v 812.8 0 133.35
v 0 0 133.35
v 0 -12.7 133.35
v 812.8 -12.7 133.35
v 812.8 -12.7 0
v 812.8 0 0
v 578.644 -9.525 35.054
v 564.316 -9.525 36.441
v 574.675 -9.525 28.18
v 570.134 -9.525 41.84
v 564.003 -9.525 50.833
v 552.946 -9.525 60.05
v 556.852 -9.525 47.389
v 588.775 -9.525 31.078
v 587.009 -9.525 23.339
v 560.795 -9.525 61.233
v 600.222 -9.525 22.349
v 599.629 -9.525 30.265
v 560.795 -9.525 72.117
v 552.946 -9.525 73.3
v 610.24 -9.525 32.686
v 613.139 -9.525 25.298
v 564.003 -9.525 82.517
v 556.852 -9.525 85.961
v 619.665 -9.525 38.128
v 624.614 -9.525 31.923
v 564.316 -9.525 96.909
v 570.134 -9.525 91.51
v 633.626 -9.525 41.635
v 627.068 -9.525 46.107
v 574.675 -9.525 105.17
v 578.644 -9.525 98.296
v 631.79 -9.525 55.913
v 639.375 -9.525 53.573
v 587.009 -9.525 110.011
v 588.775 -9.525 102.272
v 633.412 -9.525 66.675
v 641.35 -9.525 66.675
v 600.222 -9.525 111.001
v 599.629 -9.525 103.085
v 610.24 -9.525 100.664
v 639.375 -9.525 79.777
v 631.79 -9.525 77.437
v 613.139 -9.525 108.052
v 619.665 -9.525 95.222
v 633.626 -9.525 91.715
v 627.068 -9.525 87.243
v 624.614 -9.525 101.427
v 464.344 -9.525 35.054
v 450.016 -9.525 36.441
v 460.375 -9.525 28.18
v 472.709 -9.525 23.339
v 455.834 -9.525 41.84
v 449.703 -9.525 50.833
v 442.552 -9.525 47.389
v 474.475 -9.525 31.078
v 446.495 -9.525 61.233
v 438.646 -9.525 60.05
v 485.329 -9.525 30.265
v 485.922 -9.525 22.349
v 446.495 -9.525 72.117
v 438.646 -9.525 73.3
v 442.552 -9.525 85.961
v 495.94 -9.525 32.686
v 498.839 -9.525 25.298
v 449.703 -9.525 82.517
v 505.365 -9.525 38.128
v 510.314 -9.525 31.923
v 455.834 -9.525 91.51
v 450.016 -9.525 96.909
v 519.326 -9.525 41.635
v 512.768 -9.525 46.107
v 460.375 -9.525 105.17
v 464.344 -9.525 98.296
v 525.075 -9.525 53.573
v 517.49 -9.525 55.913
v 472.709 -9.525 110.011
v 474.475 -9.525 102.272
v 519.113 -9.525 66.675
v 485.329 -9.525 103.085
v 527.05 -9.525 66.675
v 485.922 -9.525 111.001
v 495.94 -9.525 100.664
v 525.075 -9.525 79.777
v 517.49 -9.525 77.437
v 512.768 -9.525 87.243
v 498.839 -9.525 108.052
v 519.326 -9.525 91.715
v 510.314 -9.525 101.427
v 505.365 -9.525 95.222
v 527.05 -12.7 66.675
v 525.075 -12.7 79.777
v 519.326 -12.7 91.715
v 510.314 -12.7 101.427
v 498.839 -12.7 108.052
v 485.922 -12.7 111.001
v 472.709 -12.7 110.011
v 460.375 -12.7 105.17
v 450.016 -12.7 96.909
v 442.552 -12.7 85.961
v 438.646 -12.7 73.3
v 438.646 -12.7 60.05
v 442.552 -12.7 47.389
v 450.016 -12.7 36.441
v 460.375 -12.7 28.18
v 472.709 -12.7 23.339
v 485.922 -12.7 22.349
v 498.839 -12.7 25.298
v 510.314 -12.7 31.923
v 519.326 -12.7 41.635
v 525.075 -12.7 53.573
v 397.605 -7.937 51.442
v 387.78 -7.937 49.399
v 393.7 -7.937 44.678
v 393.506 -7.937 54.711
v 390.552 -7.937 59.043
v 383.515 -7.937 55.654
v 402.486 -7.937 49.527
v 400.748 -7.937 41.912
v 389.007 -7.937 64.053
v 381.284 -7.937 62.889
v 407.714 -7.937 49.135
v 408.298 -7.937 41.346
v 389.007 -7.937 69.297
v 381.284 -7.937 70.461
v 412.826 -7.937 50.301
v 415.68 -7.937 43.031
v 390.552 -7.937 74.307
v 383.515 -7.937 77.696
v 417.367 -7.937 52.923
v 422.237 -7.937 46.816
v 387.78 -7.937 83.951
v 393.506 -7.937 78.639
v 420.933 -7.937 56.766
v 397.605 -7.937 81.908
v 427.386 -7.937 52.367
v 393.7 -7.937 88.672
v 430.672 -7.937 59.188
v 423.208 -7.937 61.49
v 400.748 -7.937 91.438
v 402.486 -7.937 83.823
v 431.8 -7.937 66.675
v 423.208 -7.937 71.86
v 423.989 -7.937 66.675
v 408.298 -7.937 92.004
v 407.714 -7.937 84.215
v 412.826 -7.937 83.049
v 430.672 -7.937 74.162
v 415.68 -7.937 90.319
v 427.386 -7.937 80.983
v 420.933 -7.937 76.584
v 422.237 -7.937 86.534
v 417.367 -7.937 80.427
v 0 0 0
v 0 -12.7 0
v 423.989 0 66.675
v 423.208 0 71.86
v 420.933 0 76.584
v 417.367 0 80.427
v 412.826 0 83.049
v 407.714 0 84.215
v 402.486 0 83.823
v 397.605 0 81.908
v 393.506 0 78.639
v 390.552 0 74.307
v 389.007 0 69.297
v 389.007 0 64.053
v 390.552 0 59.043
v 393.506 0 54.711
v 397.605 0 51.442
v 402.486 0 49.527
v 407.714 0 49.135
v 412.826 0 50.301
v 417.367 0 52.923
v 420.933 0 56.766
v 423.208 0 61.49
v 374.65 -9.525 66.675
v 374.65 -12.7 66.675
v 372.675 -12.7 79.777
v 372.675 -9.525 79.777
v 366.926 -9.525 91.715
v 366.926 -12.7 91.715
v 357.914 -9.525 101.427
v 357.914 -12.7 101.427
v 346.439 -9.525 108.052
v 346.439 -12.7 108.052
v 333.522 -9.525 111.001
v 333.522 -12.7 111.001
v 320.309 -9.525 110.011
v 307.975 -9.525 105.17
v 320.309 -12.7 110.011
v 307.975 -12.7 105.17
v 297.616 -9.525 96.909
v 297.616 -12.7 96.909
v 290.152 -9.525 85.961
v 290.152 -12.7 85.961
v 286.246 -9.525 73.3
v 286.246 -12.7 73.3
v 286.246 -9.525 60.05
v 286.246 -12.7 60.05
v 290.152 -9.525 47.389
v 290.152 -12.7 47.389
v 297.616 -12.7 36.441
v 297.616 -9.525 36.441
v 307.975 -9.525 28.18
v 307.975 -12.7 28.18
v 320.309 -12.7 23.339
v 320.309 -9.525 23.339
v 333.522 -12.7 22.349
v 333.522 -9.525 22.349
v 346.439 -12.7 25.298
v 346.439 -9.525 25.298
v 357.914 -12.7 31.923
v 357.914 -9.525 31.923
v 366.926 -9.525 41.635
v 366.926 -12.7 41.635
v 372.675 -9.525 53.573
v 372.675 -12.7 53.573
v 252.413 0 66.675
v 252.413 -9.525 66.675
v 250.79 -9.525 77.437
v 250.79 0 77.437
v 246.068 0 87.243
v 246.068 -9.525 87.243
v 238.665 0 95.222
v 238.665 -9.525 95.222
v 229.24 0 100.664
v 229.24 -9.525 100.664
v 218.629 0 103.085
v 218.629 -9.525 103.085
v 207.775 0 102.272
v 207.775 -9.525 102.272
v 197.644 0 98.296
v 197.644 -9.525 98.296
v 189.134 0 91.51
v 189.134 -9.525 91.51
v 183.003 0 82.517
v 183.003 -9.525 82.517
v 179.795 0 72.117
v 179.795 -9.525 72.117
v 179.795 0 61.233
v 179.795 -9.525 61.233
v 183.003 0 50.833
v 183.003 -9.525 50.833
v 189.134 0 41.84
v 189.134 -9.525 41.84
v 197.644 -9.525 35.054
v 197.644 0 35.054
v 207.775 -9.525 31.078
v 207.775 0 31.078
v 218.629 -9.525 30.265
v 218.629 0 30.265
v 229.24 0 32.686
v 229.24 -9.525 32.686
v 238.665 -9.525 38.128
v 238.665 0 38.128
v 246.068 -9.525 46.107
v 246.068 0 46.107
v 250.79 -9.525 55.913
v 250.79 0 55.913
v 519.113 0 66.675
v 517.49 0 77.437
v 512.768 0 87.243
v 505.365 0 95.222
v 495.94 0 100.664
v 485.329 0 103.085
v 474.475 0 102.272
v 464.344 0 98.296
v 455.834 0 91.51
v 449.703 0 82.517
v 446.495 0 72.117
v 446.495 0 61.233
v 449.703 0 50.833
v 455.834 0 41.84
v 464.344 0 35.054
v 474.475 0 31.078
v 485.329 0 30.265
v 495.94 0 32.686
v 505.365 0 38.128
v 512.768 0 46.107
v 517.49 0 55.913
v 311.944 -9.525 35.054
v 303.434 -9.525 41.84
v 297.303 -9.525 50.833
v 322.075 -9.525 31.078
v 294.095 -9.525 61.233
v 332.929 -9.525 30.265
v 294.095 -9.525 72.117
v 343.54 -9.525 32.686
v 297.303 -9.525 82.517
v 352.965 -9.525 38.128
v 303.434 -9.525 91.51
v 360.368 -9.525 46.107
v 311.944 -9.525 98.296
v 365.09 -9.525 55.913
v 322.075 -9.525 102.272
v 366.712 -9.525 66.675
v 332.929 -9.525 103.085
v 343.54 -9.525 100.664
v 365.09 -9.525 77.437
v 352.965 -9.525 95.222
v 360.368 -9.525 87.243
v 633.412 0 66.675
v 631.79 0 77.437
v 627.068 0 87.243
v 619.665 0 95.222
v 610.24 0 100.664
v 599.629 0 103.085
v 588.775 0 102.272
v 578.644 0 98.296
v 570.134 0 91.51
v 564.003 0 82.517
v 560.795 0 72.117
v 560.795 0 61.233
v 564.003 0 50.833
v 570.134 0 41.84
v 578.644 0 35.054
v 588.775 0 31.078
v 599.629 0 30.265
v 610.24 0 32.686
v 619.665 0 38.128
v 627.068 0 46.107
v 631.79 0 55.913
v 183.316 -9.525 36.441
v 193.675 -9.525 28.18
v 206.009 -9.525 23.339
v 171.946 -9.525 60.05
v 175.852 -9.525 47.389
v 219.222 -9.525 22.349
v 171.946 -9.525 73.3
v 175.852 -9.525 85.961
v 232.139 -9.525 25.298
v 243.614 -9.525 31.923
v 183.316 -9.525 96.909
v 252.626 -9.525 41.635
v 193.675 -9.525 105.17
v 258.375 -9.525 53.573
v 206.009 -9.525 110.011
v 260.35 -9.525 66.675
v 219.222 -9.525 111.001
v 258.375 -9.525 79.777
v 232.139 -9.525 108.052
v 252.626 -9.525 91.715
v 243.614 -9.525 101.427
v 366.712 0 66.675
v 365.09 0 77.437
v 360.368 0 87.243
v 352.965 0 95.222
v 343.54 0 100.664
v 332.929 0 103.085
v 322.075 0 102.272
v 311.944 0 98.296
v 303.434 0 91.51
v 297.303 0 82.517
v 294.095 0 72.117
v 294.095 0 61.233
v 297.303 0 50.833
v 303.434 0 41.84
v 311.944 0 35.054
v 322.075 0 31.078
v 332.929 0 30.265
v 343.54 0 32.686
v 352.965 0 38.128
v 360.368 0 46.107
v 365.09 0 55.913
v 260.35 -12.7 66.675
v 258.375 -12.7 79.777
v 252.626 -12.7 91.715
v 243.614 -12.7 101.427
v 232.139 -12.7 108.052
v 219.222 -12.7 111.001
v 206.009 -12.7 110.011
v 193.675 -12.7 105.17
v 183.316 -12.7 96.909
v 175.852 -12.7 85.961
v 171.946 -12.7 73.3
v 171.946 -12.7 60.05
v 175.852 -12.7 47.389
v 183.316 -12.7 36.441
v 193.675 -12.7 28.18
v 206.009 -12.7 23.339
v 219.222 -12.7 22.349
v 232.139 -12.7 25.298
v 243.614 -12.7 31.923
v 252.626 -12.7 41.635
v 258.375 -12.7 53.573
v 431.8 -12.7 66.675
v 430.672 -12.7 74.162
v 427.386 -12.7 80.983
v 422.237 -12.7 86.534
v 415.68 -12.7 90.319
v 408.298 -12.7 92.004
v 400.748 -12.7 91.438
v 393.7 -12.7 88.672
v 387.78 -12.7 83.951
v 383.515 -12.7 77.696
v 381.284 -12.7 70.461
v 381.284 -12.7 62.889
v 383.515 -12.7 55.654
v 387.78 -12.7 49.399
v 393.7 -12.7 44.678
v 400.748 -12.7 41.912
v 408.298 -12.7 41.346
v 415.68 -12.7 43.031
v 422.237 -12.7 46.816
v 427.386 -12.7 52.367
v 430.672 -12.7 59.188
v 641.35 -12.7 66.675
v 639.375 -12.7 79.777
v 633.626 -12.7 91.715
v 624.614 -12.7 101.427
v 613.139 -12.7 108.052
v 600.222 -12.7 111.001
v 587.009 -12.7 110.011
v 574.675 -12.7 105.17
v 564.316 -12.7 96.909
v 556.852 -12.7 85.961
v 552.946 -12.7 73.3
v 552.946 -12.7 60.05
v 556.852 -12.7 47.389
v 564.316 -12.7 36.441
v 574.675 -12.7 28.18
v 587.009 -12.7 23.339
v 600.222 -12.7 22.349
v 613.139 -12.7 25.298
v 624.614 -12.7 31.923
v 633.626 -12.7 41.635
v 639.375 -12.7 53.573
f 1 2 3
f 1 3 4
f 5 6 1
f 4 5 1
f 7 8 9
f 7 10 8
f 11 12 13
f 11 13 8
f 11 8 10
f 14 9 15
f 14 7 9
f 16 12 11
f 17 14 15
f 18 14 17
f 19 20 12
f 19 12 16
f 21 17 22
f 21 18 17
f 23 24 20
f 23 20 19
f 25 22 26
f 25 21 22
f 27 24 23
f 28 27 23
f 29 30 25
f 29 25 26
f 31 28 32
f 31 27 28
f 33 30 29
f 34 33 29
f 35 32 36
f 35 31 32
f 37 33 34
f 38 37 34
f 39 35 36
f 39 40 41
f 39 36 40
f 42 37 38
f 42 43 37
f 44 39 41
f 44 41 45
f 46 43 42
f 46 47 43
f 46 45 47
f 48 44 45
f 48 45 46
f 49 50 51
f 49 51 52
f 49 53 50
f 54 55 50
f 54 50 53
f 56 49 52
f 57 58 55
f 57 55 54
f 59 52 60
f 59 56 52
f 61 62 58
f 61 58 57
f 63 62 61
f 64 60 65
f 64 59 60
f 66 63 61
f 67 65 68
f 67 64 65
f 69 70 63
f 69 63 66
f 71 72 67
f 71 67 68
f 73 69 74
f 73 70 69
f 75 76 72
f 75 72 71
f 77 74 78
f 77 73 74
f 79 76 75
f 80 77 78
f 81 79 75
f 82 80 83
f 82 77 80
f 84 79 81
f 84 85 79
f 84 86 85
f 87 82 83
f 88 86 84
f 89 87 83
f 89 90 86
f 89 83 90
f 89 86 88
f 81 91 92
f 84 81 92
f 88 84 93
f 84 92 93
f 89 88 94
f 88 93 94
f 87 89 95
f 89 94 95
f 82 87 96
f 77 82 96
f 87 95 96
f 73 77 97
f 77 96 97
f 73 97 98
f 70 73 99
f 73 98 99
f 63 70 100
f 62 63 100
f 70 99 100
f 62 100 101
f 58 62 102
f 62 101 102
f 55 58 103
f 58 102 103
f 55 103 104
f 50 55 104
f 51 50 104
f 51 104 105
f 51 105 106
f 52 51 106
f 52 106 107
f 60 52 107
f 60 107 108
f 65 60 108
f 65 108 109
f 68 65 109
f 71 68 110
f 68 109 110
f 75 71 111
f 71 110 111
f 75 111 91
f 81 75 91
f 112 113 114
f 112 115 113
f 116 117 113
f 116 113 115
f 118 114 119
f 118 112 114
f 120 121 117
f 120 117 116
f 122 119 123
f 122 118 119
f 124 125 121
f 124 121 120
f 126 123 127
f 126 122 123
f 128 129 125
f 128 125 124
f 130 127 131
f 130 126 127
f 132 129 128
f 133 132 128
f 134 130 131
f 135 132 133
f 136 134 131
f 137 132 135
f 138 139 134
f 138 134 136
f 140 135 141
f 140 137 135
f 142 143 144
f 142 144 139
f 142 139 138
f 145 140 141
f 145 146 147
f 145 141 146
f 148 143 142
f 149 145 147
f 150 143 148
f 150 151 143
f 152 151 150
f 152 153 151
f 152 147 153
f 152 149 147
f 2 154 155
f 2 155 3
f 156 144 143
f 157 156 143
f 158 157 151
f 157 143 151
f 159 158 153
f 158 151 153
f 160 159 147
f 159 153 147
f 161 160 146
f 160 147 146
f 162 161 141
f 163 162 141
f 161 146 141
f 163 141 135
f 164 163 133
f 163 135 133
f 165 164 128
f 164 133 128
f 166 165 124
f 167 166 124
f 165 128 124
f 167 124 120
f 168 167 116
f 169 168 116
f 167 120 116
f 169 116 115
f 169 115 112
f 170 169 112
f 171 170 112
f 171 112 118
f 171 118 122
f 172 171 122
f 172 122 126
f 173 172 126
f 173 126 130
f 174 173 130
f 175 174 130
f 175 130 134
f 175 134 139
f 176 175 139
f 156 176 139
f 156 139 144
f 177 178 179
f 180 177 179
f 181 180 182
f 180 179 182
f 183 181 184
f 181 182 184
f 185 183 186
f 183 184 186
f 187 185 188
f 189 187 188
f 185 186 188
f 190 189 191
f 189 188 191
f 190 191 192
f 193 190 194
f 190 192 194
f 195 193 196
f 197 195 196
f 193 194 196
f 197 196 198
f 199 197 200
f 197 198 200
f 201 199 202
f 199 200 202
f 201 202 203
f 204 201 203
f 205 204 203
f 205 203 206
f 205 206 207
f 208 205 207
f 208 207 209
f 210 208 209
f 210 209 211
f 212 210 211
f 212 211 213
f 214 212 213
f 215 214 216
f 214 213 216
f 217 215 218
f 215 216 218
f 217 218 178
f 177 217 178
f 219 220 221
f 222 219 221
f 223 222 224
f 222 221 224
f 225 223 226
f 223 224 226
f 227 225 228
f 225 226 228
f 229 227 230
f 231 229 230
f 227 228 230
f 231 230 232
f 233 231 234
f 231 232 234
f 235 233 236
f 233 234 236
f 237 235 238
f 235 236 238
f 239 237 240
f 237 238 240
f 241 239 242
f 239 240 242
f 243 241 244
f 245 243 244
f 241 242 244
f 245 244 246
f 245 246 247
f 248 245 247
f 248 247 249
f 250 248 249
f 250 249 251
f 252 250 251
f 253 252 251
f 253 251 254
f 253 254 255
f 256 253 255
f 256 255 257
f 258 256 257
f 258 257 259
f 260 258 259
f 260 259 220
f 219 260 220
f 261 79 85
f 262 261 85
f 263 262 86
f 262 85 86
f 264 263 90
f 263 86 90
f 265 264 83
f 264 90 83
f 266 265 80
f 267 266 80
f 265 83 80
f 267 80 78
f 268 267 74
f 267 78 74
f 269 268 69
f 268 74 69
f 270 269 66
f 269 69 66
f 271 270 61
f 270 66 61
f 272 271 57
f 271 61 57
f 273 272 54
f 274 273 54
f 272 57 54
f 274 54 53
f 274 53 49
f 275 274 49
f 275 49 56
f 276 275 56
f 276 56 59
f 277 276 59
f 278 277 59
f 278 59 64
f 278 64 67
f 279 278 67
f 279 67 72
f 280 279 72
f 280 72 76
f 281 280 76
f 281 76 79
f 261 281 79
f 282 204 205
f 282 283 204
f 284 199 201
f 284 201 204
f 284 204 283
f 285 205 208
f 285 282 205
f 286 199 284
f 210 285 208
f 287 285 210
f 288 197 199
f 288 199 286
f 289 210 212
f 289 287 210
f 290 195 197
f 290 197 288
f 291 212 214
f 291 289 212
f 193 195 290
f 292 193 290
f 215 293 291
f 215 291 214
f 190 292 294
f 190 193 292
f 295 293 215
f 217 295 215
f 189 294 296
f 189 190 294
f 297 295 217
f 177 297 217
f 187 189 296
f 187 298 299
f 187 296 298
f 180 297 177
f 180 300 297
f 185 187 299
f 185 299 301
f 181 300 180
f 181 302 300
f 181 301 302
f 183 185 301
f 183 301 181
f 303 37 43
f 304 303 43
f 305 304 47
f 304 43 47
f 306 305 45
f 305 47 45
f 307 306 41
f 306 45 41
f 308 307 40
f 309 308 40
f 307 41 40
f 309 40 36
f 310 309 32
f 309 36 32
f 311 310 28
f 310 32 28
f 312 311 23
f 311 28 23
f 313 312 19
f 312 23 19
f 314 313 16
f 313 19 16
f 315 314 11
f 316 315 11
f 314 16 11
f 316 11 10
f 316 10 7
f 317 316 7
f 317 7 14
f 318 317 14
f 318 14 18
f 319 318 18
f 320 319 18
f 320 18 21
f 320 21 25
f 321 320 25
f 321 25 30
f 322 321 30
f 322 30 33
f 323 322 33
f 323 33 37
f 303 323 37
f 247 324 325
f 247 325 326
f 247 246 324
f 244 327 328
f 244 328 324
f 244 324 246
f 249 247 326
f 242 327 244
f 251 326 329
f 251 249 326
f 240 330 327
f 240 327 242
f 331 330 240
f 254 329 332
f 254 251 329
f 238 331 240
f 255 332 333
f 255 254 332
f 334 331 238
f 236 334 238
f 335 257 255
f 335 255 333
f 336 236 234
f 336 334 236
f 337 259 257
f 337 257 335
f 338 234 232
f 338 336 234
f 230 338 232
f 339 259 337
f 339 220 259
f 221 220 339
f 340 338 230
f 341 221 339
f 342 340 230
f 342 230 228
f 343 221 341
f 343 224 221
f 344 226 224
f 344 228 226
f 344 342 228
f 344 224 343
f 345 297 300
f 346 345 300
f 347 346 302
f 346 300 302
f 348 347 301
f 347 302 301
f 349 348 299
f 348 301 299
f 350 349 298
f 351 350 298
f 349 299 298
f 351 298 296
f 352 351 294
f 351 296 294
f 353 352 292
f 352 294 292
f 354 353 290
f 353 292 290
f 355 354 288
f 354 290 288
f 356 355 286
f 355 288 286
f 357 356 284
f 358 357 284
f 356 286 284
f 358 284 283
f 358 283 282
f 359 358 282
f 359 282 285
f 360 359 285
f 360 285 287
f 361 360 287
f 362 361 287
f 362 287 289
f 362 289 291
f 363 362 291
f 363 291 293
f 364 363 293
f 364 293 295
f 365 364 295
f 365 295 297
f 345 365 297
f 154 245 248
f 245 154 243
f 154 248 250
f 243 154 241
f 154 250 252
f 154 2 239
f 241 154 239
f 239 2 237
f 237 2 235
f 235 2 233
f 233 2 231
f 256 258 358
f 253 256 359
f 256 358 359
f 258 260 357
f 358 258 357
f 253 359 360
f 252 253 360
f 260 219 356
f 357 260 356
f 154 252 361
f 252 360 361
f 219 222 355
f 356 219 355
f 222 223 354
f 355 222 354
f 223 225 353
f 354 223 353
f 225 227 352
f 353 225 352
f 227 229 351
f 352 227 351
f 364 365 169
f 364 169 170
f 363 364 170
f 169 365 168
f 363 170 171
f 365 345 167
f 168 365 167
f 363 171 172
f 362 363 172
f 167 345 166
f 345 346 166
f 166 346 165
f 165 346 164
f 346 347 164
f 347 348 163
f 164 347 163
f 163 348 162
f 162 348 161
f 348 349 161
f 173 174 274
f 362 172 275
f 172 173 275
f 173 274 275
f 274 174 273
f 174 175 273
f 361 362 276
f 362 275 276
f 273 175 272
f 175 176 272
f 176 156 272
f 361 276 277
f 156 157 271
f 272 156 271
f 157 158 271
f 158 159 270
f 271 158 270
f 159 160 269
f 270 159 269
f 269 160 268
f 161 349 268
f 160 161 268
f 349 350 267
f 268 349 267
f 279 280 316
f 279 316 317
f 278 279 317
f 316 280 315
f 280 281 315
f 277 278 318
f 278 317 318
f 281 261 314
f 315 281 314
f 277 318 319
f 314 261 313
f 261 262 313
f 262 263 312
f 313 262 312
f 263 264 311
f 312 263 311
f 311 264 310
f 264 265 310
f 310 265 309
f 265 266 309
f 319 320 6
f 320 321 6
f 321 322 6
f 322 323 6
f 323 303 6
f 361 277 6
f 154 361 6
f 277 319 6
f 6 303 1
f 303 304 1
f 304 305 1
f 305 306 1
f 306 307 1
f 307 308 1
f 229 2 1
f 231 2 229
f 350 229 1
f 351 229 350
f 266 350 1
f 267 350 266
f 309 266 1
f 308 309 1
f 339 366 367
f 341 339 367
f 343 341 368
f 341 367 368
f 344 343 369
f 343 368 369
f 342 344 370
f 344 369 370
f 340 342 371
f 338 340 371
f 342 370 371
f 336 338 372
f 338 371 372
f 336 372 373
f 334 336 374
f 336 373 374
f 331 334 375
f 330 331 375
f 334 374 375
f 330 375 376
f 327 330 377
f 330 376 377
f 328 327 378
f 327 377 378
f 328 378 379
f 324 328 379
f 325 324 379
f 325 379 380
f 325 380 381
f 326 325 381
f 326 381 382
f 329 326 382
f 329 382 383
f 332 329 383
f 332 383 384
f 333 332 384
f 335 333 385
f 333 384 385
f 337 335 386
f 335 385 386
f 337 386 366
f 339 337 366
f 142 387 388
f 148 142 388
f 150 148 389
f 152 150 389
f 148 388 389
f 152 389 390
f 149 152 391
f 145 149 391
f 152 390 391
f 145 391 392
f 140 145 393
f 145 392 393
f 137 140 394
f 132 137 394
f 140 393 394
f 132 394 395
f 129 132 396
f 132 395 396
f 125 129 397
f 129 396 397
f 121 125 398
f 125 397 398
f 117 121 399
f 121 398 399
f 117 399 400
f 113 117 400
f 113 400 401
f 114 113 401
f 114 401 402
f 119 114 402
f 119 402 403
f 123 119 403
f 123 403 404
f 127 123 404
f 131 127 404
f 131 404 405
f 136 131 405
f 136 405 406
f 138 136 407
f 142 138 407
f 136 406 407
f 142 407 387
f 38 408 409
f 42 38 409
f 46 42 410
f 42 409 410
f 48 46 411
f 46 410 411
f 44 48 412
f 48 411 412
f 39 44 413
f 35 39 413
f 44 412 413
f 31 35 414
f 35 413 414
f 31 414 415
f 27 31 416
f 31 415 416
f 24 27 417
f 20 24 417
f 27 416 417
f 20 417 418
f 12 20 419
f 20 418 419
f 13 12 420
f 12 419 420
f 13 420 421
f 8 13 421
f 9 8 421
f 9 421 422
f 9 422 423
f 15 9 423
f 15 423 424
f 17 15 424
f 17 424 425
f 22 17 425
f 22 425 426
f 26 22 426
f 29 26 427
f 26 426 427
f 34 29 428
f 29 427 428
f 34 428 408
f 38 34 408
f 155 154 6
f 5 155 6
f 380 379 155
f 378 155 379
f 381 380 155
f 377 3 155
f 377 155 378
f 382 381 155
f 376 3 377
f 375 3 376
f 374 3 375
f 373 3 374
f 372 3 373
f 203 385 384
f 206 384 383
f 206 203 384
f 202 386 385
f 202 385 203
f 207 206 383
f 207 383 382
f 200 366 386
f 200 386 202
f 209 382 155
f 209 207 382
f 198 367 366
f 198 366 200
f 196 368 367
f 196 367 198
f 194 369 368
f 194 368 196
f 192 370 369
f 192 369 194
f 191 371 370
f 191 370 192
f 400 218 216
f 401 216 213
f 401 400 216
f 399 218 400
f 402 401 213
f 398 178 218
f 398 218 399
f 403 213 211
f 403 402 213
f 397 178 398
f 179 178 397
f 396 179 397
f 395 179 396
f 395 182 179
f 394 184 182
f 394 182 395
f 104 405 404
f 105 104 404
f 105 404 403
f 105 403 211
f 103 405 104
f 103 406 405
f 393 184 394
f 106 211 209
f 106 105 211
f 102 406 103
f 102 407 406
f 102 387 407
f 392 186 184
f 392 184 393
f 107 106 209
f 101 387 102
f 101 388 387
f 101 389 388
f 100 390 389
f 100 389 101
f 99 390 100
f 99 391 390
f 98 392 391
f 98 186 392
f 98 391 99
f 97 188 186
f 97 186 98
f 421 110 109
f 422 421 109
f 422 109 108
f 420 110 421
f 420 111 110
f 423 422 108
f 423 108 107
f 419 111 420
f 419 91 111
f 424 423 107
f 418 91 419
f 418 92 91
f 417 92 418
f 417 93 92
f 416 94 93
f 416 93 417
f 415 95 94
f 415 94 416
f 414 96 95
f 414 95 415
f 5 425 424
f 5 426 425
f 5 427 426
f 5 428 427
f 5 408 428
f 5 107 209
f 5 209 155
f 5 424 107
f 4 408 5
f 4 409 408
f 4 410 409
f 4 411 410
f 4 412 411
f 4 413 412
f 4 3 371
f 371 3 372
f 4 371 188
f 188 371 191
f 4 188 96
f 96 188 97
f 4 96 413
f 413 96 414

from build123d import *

# Parameters (mm, degrees)
SKETCH_W        = 812.8
SKETCH_H        = 133.35
PAD_DEPTH       = 12.7
SKETCH001_R     = 17.5895
SKETCH001_R_2   = 36.5125
POCKET_DEPTH    = 12.701
SKETCH002_R     = 44.45
POCKET001_DEPTH = 3.175
SKETCH003_R     = 25.4
POCKET002_DEPTH = 4.7625


with BuildPart() as part:
    # Sketch → Pad (new body)
    with BuildSketch(Plane.XZ):
        with Locations((406.4, 66.675)):
            Rectangle(SKETCH_W, SKETCH_H)
    extrude(amount=PAD_DEPTH)

    # Sketch001 (on Face6 of Pad) → Pocket (cut, through all)
    with BuildSketch(Plane.XZ.offset(12.7)):
        with Locations((406.4, 66.675)):
            Circle(SKETCH001_R)
        with Locations((330.2, 66.675)):
            Circle(SKETCH001_R_2)
        with Locations((215.9, 66.675)):
            Circle(SKETCH001_R_2)
        with Locations((596.9, 66.675)):
            Circle(SKETCH001_R_2)
        with Locations((482.6, 66.675)):
            Circle(SKETCH001_R_2)
    extrude(amount=-POCKET_DEPTH, mode=Mode.SUBTRACT)

    # Sketch002 (on Face5 of Pocket) → Pocket001 (cut)
    with BuildSketch(Plane.XZ.offset(12.7)):
        with Locations((215.9, 66.675)):
            Circle(SKETCH002_R)
        with Locations((330.2, 66.675)):
            Circle(SKETCH002_R)
        with Locations((482.6, 66.675)):
            Circle(SKETCH002_R)
        with Locations((596.9, 66.675)):
            Circle(SKETCH002_R)
    extrude(amount=-POCKET001_DEPTH, mode=Mode.SUBTRACT)

    # Sketch003 (on Face5 of Pocket001) → Pocket002 (cut)
    with BuildSketch(Plane.XZ.offset(12.7)):
        with Locations((406.4, 66.675)):
            Circle(SKETCH003_R)
    extrude(amount=-POCKET002_DEPTH, mode=Mode.SUBTRACT)


solid = part.part
